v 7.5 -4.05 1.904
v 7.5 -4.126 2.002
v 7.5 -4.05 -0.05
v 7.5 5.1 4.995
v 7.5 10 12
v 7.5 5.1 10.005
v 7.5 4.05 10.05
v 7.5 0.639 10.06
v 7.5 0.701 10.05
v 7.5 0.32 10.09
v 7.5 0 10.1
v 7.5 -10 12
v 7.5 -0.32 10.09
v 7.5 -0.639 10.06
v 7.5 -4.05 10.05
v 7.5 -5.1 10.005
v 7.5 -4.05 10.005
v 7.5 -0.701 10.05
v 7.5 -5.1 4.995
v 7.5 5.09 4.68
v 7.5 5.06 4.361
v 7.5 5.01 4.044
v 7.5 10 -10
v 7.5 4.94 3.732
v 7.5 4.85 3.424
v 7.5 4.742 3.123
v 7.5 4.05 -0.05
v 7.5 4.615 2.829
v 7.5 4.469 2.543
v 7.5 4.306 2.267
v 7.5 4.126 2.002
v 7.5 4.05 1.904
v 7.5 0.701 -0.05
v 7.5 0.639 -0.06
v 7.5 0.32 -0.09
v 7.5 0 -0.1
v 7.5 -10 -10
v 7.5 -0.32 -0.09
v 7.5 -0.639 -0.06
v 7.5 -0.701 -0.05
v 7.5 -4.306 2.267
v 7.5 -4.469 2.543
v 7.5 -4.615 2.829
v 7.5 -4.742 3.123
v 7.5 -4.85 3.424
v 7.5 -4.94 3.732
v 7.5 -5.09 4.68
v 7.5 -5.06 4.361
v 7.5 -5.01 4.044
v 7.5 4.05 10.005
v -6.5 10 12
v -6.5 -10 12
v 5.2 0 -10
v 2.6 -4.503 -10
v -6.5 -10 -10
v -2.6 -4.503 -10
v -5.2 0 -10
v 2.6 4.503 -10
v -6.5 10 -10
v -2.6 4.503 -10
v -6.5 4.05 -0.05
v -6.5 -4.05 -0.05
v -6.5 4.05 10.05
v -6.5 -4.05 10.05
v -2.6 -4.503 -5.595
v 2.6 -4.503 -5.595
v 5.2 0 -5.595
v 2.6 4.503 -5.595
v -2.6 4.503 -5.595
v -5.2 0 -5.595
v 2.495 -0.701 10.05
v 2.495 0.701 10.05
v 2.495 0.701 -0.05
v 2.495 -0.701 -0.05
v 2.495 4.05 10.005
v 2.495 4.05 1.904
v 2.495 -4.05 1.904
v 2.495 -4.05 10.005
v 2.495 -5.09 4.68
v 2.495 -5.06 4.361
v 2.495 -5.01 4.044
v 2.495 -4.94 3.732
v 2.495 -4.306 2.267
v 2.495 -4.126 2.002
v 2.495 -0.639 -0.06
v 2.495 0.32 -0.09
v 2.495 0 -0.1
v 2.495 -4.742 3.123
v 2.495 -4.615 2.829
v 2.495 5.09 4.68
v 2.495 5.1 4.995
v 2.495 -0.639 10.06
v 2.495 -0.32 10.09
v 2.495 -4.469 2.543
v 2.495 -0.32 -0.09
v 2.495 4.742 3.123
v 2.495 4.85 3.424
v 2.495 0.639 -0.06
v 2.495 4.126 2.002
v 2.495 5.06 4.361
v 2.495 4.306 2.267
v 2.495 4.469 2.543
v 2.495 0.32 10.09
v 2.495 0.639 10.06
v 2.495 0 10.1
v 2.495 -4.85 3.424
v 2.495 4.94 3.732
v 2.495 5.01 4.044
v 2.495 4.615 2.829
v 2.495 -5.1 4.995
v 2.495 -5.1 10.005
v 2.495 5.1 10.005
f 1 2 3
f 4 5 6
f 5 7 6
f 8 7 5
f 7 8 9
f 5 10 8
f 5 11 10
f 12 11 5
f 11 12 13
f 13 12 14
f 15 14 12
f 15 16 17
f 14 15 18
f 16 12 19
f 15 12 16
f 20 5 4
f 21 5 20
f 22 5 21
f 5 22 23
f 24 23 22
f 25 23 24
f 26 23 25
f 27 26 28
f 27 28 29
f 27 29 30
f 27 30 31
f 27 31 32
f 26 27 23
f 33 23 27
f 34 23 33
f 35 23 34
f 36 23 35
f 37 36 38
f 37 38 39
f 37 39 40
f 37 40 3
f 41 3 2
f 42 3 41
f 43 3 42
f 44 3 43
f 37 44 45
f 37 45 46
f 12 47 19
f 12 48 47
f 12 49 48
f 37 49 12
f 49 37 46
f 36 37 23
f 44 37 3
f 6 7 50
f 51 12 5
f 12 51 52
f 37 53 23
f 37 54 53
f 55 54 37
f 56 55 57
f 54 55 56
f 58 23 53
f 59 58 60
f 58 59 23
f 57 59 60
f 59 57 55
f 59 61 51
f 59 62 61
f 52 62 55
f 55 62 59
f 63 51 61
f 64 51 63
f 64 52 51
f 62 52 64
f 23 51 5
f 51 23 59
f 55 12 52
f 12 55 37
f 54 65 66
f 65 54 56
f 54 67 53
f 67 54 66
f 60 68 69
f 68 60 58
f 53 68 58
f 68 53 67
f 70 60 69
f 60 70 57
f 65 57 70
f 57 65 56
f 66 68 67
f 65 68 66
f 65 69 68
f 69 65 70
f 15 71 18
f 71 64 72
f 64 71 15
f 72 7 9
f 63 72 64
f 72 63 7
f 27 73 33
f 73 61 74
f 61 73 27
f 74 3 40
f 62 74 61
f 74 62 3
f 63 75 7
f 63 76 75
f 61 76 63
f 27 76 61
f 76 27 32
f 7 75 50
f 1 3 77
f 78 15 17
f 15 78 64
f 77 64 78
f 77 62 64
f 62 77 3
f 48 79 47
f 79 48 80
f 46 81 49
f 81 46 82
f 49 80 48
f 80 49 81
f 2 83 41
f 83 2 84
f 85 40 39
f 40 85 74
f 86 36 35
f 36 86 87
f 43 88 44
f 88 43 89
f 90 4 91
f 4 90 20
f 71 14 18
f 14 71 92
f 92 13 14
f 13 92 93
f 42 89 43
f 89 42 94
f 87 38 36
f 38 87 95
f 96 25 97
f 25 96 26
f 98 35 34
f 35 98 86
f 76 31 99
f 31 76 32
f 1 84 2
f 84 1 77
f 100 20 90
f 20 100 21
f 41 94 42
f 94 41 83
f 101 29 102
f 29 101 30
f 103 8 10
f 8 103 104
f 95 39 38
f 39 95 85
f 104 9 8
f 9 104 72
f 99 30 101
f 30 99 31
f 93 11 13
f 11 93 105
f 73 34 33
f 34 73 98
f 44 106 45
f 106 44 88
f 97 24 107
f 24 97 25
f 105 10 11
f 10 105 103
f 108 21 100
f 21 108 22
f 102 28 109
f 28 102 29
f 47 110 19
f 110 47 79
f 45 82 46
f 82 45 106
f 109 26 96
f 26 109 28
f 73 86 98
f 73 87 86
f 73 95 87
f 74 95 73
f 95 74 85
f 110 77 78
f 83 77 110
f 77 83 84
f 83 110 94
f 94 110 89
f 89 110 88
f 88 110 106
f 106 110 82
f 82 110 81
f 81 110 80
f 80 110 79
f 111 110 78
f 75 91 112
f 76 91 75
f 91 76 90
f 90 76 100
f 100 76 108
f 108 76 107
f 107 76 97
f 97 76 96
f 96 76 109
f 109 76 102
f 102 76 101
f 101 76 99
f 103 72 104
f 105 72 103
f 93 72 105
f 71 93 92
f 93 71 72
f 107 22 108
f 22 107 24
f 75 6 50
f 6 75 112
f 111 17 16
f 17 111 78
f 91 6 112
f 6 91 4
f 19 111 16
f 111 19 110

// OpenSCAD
$fn=100;
up=0;

difference(){
translate([0,0,-up/2])
translate([0.5,0,1])
cube([14,20,22+up],center=true);

translate([0,0,-up]){
translate([0,0,-10+2.2])
cylinder(r=5.2,h=4.41,center=true,$fn=6);
}

translate([0,0,10-5])
cube([15.1,8.1,10.1],center=true);

translate([7.5-2.5,0,5])
rotate([0,90,0])
cylinder(r=5.1,h=5.01,center=true);

translate([7.5-2.5,0,7.5])
cube([5.01,10.2,5.01],center=true);
}
